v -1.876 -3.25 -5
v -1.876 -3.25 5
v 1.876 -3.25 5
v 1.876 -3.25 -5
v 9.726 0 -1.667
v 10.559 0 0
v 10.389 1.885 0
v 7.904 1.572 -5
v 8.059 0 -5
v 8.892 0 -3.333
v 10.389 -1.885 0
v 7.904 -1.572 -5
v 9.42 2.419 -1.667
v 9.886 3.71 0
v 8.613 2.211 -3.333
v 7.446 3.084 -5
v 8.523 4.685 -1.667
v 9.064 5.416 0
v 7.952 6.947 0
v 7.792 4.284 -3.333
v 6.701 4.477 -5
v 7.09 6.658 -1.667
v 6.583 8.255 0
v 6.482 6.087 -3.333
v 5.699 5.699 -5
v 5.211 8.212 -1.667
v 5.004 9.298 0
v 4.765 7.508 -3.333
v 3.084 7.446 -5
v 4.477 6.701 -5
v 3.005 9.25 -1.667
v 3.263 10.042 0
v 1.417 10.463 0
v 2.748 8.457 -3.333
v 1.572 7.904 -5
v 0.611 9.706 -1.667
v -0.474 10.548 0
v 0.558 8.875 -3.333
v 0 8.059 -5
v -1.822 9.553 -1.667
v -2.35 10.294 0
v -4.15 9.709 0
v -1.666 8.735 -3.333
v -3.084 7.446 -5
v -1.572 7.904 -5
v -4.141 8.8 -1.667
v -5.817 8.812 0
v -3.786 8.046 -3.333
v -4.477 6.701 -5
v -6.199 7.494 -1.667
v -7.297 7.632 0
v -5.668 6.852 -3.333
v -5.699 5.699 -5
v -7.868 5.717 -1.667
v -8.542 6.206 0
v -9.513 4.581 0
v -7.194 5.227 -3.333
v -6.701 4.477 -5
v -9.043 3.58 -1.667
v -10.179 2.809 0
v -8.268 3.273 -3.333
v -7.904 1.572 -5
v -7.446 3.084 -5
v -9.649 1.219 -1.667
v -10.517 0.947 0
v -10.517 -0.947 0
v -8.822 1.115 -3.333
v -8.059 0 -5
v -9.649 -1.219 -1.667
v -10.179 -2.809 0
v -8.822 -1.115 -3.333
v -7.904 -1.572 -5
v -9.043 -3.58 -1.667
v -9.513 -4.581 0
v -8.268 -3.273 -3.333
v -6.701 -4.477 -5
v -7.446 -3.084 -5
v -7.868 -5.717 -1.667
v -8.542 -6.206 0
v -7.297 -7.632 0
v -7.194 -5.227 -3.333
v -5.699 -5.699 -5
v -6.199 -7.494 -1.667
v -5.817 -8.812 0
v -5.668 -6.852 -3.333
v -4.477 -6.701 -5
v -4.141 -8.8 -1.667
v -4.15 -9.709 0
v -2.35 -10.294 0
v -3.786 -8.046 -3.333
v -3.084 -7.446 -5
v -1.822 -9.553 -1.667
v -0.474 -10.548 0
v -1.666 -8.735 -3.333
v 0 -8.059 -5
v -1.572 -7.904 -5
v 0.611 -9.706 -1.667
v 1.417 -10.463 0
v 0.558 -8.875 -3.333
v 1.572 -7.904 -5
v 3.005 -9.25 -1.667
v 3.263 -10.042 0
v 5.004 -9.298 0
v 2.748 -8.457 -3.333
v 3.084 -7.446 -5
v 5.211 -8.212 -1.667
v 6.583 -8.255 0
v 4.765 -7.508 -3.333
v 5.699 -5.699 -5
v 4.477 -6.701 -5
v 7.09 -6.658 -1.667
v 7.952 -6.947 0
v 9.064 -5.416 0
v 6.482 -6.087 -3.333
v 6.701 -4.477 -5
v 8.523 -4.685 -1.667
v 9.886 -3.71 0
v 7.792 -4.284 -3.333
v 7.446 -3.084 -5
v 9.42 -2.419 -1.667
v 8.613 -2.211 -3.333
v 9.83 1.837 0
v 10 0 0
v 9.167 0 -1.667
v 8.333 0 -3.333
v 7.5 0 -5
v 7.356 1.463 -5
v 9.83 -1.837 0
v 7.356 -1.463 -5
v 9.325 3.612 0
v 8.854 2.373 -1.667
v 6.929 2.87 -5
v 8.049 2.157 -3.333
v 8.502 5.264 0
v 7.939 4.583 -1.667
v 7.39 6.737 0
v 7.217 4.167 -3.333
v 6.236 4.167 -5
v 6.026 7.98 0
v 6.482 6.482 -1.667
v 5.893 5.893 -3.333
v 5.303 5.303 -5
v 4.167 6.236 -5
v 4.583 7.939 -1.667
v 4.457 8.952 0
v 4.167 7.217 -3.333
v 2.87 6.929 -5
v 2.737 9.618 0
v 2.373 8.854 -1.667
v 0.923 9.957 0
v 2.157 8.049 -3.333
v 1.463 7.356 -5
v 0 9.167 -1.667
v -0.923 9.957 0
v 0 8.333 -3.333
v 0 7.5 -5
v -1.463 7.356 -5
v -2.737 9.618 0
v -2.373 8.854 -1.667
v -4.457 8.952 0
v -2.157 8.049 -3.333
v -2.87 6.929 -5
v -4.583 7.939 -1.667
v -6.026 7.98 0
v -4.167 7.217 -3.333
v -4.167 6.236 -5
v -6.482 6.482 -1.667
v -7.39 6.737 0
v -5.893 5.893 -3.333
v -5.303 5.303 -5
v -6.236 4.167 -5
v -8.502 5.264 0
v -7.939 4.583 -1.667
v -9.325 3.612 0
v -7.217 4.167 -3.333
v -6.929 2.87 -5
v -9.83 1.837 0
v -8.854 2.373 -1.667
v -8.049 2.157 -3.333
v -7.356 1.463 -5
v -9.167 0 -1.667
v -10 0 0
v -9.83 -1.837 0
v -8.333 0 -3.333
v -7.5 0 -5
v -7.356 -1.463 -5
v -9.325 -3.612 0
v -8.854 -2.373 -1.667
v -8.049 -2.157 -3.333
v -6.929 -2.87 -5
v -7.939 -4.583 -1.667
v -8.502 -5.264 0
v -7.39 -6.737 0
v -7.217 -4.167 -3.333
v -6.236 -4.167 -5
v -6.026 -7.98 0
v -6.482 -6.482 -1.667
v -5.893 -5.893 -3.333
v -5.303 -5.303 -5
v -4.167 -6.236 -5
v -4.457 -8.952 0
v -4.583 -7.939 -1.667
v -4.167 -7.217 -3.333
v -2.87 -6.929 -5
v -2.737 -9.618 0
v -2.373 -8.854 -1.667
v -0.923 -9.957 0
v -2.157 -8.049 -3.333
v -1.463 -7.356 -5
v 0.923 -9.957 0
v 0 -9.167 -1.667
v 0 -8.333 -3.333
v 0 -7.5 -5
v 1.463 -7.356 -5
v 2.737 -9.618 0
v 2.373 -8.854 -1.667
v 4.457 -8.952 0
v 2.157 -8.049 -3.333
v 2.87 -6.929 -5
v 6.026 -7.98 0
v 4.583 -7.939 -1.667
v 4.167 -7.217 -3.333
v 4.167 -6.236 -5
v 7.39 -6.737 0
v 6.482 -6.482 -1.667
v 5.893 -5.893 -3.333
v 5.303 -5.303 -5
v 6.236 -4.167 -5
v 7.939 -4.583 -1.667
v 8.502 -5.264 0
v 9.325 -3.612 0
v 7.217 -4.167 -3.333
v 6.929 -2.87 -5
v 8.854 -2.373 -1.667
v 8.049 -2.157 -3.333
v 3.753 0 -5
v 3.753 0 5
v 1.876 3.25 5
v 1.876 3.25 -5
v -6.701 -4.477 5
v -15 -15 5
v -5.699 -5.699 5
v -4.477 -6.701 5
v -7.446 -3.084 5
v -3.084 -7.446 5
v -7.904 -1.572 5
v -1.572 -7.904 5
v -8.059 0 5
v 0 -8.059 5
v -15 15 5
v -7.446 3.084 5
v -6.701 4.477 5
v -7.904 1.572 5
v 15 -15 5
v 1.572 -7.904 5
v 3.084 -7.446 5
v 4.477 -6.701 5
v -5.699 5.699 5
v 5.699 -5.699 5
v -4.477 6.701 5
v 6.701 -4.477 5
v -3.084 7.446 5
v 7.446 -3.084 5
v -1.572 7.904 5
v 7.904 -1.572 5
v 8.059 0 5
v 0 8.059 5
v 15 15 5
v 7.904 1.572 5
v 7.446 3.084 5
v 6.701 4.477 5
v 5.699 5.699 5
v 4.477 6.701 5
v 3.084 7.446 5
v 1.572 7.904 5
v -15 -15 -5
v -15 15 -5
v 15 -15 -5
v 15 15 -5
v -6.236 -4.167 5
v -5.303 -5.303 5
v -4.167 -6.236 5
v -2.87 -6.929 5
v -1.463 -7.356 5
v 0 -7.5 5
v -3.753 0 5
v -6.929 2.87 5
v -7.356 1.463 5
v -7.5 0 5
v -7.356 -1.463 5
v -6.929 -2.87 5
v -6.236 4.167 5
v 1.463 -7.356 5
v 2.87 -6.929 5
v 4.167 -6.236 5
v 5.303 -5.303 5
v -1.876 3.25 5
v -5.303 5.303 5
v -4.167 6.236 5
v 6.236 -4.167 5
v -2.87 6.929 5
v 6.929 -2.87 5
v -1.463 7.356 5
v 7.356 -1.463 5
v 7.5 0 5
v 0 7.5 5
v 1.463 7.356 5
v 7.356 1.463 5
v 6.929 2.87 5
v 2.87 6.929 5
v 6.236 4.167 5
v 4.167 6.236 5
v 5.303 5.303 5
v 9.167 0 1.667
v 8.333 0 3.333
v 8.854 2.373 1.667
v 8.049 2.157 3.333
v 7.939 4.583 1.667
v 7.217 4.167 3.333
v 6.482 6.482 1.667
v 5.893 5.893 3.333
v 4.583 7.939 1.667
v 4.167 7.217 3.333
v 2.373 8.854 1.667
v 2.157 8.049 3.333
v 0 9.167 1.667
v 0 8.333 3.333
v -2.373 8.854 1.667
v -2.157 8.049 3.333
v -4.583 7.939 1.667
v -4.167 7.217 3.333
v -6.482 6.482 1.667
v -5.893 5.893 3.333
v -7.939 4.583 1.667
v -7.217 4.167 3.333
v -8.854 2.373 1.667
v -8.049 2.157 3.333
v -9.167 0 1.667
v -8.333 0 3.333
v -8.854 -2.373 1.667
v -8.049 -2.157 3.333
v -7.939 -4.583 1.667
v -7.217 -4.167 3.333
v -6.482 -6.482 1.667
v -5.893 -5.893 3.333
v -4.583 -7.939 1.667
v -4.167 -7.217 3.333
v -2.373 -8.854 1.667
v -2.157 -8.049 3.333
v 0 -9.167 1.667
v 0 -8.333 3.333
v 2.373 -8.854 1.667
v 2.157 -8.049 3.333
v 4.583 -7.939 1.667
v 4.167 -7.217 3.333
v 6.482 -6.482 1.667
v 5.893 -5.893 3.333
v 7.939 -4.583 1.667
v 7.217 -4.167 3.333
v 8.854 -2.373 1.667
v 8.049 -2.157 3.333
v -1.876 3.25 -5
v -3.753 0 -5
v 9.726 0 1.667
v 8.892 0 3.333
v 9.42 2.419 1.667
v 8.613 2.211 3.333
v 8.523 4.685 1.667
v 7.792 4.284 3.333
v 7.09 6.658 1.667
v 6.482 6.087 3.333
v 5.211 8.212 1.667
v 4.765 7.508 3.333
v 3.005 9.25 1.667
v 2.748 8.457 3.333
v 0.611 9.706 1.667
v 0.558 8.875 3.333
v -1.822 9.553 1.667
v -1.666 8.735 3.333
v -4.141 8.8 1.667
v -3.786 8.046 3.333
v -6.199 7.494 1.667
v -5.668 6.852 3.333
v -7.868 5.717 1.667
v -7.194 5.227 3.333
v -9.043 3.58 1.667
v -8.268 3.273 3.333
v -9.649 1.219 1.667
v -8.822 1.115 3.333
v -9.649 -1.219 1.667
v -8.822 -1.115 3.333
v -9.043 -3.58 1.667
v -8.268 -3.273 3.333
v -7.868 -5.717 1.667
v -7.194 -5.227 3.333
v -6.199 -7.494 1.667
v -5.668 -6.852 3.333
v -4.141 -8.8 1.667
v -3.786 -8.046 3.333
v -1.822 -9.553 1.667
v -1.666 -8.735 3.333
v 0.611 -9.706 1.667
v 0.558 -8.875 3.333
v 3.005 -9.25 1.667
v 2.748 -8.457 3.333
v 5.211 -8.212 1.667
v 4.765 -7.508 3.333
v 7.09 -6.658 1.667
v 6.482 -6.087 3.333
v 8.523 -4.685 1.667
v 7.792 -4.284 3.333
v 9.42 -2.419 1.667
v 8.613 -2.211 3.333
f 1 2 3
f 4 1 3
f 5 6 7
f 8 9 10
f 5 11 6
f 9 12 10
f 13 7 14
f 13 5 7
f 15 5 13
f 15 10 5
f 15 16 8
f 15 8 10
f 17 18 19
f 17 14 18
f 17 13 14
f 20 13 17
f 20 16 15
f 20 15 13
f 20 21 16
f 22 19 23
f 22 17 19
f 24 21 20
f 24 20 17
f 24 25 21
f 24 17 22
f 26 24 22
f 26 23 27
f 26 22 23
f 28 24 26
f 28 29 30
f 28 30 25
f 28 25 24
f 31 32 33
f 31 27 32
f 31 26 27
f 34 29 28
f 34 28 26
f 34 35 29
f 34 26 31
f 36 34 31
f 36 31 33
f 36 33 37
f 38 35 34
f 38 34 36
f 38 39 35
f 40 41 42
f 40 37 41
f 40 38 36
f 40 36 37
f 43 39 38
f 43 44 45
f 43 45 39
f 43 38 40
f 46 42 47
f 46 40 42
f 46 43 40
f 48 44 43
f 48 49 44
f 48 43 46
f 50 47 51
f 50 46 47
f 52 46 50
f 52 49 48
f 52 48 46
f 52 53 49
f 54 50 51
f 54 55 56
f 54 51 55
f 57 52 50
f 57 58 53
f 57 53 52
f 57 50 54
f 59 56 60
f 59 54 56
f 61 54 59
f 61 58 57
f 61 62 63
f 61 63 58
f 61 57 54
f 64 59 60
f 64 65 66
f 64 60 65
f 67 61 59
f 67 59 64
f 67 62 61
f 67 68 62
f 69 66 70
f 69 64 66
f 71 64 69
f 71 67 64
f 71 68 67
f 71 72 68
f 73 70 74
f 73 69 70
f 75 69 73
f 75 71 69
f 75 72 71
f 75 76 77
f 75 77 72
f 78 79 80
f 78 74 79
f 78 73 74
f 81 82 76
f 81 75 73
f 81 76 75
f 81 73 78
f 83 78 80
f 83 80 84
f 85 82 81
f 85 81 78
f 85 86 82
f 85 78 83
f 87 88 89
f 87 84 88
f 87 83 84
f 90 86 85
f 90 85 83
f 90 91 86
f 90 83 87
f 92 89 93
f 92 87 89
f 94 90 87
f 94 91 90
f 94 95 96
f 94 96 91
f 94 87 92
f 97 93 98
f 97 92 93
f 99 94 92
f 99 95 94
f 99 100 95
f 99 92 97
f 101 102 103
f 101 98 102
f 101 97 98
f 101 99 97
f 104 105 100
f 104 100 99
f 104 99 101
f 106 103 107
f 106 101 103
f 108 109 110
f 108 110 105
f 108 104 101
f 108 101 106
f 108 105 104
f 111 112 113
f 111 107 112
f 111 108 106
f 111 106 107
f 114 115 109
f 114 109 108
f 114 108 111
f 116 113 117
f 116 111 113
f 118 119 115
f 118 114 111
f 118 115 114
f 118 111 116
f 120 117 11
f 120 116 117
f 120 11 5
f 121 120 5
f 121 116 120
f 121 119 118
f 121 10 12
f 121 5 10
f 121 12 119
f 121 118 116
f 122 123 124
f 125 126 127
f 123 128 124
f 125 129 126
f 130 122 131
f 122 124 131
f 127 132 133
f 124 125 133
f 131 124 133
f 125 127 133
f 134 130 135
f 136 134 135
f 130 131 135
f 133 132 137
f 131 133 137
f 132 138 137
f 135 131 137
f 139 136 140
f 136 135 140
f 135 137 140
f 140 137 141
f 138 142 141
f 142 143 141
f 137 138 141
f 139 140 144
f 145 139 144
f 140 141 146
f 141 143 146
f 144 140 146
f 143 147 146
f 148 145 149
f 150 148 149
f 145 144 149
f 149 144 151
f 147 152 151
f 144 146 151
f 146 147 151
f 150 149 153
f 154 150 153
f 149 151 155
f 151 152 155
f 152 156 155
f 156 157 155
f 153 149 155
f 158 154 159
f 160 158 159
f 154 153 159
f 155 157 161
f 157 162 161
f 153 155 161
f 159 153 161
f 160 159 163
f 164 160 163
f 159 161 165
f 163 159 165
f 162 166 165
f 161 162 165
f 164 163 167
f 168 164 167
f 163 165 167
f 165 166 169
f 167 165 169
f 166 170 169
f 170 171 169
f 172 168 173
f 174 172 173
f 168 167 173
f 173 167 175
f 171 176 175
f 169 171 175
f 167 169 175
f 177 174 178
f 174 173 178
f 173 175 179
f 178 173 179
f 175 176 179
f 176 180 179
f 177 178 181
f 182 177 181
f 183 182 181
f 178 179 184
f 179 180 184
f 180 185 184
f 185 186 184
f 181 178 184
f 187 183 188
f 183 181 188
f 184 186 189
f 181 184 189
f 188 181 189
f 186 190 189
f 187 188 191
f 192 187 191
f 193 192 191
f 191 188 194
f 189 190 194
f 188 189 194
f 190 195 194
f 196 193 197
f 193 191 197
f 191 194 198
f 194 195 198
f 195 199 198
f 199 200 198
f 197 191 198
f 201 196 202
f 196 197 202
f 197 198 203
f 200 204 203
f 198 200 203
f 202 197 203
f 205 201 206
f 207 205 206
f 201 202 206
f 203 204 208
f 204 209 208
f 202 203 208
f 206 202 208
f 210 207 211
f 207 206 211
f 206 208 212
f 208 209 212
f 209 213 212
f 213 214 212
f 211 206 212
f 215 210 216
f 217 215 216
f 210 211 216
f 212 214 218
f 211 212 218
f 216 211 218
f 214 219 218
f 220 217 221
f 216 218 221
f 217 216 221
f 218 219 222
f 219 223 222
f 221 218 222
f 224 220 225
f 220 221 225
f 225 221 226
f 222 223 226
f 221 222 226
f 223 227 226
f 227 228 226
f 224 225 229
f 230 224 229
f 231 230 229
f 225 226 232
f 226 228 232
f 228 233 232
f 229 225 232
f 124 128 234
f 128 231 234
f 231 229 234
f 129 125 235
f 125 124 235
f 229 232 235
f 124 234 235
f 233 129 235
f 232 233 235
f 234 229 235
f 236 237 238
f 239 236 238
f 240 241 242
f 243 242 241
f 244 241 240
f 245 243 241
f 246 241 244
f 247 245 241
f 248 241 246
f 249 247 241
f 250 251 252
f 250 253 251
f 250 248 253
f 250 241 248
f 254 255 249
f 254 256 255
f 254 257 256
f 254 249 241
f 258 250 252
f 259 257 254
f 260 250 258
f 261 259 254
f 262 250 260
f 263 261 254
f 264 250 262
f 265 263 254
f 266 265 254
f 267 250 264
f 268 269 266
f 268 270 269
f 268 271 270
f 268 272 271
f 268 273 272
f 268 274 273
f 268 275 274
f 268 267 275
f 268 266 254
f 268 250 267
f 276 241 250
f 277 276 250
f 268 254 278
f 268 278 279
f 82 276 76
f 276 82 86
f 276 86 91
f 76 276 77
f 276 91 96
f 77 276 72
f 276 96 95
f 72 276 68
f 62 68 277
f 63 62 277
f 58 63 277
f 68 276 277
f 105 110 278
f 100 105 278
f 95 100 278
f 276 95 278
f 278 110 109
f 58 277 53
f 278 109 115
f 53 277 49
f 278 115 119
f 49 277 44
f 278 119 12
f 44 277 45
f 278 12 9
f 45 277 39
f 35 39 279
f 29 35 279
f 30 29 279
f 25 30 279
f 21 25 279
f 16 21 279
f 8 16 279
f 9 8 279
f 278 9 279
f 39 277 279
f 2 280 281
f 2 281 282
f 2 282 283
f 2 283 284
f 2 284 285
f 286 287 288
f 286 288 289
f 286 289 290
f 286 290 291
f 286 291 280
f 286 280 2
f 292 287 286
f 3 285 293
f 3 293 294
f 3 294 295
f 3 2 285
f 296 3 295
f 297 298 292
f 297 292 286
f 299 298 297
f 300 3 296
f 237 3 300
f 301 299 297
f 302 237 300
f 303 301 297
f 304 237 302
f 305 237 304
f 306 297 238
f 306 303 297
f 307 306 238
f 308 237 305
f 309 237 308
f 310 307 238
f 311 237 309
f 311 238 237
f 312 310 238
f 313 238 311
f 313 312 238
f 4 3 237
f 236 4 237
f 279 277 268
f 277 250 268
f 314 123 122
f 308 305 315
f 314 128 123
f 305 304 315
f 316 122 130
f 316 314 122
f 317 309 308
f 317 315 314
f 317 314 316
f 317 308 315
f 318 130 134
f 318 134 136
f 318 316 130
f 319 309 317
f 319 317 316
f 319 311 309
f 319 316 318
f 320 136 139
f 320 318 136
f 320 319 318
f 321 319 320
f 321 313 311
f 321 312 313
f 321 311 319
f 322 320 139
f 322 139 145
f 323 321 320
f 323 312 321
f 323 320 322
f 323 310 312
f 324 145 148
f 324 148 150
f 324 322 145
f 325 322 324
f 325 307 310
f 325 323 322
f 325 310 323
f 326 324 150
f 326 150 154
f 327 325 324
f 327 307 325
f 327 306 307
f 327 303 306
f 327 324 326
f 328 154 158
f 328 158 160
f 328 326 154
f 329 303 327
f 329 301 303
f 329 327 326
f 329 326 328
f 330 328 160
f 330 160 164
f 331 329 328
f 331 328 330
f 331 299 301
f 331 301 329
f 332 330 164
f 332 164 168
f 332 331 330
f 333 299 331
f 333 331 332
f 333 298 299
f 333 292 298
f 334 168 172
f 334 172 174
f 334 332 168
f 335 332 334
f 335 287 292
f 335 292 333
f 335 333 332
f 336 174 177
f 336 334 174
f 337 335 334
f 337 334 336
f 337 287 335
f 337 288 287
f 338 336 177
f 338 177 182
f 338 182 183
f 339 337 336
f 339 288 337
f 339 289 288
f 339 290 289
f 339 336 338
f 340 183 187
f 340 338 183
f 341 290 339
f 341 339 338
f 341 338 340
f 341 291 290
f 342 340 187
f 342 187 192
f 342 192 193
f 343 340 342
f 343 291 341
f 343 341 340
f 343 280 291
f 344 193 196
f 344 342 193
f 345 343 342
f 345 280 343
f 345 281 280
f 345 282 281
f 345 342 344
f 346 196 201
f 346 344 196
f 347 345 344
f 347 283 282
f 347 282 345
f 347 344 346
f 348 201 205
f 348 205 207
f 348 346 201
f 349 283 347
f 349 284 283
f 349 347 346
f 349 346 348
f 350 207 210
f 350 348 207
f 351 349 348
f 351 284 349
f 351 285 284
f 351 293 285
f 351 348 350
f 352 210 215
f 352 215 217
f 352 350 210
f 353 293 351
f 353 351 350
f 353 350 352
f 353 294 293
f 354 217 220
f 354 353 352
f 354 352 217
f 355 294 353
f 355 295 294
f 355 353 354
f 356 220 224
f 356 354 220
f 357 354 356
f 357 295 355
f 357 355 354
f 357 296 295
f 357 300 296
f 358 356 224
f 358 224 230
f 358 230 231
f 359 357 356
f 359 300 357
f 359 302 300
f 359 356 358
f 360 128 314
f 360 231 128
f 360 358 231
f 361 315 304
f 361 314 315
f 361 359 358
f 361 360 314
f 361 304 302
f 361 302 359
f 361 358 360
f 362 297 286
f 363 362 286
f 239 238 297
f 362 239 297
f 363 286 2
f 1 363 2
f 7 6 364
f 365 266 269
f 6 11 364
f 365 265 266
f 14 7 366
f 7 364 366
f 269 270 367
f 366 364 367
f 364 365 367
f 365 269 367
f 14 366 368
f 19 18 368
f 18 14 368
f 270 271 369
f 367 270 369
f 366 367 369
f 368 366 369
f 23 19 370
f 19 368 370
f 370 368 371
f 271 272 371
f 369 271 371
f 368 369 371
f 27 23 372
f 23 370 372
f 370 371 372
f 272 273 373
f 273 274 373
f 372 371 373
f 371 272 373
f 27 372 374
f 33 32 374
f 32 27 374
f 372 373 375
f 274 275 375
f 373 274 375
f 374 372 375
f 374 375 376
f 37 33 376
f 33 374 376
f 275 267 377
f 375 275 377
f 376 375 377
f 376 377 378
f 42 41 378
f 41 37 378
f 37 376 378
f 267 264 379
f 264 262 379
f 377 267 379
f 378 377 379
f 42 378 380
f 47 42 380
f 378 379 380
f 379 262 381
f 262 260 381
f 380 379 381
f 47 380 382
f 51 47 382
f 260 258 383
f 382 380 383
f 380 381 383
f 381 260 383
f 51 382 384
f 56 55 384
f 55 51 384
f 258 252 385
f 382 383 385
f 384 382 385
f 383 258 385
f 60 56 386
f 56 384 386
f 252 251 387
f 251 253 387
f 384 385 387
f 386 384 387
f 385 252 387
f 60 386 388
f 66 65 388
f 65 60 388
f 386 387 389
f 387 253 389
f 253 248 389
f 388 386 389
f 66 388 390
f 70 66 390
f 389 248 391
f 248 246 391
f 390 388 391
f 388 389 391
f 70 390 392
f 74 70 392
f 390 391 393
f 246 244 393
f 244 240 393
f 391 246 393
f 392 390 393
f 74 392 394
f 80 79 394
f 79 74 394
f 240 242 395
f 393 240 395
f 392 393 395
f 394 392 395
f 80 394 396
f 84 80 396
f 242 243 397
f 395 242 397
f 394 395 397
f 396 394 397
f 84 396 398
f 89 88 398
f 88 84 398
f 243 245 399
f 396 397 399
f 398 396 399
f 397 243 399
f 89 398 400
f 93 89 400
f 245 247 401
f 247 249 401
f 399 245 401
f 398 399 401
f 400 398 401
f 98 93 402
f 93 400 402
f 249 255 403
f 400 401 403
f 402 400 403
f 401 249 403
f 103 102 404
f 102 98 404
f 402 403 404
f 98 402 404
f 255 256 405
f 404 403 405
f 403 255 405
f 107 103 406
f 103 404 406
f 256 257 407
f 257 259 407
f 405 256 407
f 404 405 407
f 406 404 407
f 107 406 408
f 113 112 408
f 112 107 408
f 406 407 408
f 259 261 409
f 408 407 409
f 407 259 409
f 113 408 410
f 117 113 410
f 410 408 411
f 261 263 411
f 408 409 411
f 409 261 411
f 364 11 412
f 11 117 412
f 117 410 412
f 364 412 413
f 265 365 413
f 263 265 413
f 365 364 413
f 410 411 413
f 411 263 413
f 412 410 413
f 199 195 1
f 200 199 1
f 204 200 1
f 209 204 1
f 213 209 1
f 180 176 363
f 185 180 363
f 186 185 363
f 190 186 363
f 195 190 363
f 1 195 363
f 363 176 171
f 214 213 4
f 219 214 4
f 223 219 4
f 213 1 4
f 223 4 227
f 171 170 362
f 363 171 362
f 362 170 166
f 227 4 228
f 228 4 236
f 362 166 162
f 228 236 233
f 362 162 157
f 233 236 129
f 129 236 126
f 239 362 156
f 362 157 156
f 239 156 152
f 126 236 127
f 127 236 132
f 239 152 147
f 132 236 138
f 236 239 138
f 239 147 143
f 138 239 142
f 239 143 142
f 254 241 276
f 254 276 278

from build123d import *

# Parameters (mm, degrees)
F1_R      = 10
F2_R      = 7.5
F1_W      = 30
F1_H      = 30
F5_DEPTH  = 5
F6_OFFSET = 0.5
F8_DEPTH  = 12.5


with BuildPart() as f3:
    # F1 (on Top) → F3 section 0
    with BuildSketch(Plane.XY):
        Circle(F1_R)
    # F2 (on offset) → F3 section 1
    with BuildSketch(Plane.XY.offset(5)):
        Circle(F2_R)
    loft()

    # F4: F3 across plane


with BuildPart() as f3_1:
    add(f3.part)
    add(f3.part.mirror(Plane.XY))


with BuildPart() as f5:
    # F1 (on Top) → F5 (new body, symmetric)
    with BuildSketch(Plane.XY):
        Rectangle(F1_W, F1_H)
        Circle(F1_R, mode=Mode.SUBTRACT)
        Circle(F1_R)
    extrude(amount=F5_DEPTH, both=True)

    # F6: cut F3, made larger all round first
    f6_tool = offset(f3_1.part, amount=F6_OFFSET, kind=Kind.INTERSECTION, mode=Mode.PRIVATE)
    add(f6_tool, mode=Mode.SUBTRACT)


with BuildPart() as f3_2:
    add(f3_1.part)

    # F7 (on Top) → F8 (cut, symmetric)
    with BuildSketch(Plane.XY):
        Polygon((1.8763883749, 3.25), (-1.8763883749, 3.25), (-3.7527767497, 0), (-1.8763883749, -3.25), (1.8763883749, -3.25), (3.7527767497, 0), align=None)
    extrude(amount=F8_DEPTH, both=True, mode=Mode.SUBTRACT)


solid = Compound([f5.part, f3_2.part])
